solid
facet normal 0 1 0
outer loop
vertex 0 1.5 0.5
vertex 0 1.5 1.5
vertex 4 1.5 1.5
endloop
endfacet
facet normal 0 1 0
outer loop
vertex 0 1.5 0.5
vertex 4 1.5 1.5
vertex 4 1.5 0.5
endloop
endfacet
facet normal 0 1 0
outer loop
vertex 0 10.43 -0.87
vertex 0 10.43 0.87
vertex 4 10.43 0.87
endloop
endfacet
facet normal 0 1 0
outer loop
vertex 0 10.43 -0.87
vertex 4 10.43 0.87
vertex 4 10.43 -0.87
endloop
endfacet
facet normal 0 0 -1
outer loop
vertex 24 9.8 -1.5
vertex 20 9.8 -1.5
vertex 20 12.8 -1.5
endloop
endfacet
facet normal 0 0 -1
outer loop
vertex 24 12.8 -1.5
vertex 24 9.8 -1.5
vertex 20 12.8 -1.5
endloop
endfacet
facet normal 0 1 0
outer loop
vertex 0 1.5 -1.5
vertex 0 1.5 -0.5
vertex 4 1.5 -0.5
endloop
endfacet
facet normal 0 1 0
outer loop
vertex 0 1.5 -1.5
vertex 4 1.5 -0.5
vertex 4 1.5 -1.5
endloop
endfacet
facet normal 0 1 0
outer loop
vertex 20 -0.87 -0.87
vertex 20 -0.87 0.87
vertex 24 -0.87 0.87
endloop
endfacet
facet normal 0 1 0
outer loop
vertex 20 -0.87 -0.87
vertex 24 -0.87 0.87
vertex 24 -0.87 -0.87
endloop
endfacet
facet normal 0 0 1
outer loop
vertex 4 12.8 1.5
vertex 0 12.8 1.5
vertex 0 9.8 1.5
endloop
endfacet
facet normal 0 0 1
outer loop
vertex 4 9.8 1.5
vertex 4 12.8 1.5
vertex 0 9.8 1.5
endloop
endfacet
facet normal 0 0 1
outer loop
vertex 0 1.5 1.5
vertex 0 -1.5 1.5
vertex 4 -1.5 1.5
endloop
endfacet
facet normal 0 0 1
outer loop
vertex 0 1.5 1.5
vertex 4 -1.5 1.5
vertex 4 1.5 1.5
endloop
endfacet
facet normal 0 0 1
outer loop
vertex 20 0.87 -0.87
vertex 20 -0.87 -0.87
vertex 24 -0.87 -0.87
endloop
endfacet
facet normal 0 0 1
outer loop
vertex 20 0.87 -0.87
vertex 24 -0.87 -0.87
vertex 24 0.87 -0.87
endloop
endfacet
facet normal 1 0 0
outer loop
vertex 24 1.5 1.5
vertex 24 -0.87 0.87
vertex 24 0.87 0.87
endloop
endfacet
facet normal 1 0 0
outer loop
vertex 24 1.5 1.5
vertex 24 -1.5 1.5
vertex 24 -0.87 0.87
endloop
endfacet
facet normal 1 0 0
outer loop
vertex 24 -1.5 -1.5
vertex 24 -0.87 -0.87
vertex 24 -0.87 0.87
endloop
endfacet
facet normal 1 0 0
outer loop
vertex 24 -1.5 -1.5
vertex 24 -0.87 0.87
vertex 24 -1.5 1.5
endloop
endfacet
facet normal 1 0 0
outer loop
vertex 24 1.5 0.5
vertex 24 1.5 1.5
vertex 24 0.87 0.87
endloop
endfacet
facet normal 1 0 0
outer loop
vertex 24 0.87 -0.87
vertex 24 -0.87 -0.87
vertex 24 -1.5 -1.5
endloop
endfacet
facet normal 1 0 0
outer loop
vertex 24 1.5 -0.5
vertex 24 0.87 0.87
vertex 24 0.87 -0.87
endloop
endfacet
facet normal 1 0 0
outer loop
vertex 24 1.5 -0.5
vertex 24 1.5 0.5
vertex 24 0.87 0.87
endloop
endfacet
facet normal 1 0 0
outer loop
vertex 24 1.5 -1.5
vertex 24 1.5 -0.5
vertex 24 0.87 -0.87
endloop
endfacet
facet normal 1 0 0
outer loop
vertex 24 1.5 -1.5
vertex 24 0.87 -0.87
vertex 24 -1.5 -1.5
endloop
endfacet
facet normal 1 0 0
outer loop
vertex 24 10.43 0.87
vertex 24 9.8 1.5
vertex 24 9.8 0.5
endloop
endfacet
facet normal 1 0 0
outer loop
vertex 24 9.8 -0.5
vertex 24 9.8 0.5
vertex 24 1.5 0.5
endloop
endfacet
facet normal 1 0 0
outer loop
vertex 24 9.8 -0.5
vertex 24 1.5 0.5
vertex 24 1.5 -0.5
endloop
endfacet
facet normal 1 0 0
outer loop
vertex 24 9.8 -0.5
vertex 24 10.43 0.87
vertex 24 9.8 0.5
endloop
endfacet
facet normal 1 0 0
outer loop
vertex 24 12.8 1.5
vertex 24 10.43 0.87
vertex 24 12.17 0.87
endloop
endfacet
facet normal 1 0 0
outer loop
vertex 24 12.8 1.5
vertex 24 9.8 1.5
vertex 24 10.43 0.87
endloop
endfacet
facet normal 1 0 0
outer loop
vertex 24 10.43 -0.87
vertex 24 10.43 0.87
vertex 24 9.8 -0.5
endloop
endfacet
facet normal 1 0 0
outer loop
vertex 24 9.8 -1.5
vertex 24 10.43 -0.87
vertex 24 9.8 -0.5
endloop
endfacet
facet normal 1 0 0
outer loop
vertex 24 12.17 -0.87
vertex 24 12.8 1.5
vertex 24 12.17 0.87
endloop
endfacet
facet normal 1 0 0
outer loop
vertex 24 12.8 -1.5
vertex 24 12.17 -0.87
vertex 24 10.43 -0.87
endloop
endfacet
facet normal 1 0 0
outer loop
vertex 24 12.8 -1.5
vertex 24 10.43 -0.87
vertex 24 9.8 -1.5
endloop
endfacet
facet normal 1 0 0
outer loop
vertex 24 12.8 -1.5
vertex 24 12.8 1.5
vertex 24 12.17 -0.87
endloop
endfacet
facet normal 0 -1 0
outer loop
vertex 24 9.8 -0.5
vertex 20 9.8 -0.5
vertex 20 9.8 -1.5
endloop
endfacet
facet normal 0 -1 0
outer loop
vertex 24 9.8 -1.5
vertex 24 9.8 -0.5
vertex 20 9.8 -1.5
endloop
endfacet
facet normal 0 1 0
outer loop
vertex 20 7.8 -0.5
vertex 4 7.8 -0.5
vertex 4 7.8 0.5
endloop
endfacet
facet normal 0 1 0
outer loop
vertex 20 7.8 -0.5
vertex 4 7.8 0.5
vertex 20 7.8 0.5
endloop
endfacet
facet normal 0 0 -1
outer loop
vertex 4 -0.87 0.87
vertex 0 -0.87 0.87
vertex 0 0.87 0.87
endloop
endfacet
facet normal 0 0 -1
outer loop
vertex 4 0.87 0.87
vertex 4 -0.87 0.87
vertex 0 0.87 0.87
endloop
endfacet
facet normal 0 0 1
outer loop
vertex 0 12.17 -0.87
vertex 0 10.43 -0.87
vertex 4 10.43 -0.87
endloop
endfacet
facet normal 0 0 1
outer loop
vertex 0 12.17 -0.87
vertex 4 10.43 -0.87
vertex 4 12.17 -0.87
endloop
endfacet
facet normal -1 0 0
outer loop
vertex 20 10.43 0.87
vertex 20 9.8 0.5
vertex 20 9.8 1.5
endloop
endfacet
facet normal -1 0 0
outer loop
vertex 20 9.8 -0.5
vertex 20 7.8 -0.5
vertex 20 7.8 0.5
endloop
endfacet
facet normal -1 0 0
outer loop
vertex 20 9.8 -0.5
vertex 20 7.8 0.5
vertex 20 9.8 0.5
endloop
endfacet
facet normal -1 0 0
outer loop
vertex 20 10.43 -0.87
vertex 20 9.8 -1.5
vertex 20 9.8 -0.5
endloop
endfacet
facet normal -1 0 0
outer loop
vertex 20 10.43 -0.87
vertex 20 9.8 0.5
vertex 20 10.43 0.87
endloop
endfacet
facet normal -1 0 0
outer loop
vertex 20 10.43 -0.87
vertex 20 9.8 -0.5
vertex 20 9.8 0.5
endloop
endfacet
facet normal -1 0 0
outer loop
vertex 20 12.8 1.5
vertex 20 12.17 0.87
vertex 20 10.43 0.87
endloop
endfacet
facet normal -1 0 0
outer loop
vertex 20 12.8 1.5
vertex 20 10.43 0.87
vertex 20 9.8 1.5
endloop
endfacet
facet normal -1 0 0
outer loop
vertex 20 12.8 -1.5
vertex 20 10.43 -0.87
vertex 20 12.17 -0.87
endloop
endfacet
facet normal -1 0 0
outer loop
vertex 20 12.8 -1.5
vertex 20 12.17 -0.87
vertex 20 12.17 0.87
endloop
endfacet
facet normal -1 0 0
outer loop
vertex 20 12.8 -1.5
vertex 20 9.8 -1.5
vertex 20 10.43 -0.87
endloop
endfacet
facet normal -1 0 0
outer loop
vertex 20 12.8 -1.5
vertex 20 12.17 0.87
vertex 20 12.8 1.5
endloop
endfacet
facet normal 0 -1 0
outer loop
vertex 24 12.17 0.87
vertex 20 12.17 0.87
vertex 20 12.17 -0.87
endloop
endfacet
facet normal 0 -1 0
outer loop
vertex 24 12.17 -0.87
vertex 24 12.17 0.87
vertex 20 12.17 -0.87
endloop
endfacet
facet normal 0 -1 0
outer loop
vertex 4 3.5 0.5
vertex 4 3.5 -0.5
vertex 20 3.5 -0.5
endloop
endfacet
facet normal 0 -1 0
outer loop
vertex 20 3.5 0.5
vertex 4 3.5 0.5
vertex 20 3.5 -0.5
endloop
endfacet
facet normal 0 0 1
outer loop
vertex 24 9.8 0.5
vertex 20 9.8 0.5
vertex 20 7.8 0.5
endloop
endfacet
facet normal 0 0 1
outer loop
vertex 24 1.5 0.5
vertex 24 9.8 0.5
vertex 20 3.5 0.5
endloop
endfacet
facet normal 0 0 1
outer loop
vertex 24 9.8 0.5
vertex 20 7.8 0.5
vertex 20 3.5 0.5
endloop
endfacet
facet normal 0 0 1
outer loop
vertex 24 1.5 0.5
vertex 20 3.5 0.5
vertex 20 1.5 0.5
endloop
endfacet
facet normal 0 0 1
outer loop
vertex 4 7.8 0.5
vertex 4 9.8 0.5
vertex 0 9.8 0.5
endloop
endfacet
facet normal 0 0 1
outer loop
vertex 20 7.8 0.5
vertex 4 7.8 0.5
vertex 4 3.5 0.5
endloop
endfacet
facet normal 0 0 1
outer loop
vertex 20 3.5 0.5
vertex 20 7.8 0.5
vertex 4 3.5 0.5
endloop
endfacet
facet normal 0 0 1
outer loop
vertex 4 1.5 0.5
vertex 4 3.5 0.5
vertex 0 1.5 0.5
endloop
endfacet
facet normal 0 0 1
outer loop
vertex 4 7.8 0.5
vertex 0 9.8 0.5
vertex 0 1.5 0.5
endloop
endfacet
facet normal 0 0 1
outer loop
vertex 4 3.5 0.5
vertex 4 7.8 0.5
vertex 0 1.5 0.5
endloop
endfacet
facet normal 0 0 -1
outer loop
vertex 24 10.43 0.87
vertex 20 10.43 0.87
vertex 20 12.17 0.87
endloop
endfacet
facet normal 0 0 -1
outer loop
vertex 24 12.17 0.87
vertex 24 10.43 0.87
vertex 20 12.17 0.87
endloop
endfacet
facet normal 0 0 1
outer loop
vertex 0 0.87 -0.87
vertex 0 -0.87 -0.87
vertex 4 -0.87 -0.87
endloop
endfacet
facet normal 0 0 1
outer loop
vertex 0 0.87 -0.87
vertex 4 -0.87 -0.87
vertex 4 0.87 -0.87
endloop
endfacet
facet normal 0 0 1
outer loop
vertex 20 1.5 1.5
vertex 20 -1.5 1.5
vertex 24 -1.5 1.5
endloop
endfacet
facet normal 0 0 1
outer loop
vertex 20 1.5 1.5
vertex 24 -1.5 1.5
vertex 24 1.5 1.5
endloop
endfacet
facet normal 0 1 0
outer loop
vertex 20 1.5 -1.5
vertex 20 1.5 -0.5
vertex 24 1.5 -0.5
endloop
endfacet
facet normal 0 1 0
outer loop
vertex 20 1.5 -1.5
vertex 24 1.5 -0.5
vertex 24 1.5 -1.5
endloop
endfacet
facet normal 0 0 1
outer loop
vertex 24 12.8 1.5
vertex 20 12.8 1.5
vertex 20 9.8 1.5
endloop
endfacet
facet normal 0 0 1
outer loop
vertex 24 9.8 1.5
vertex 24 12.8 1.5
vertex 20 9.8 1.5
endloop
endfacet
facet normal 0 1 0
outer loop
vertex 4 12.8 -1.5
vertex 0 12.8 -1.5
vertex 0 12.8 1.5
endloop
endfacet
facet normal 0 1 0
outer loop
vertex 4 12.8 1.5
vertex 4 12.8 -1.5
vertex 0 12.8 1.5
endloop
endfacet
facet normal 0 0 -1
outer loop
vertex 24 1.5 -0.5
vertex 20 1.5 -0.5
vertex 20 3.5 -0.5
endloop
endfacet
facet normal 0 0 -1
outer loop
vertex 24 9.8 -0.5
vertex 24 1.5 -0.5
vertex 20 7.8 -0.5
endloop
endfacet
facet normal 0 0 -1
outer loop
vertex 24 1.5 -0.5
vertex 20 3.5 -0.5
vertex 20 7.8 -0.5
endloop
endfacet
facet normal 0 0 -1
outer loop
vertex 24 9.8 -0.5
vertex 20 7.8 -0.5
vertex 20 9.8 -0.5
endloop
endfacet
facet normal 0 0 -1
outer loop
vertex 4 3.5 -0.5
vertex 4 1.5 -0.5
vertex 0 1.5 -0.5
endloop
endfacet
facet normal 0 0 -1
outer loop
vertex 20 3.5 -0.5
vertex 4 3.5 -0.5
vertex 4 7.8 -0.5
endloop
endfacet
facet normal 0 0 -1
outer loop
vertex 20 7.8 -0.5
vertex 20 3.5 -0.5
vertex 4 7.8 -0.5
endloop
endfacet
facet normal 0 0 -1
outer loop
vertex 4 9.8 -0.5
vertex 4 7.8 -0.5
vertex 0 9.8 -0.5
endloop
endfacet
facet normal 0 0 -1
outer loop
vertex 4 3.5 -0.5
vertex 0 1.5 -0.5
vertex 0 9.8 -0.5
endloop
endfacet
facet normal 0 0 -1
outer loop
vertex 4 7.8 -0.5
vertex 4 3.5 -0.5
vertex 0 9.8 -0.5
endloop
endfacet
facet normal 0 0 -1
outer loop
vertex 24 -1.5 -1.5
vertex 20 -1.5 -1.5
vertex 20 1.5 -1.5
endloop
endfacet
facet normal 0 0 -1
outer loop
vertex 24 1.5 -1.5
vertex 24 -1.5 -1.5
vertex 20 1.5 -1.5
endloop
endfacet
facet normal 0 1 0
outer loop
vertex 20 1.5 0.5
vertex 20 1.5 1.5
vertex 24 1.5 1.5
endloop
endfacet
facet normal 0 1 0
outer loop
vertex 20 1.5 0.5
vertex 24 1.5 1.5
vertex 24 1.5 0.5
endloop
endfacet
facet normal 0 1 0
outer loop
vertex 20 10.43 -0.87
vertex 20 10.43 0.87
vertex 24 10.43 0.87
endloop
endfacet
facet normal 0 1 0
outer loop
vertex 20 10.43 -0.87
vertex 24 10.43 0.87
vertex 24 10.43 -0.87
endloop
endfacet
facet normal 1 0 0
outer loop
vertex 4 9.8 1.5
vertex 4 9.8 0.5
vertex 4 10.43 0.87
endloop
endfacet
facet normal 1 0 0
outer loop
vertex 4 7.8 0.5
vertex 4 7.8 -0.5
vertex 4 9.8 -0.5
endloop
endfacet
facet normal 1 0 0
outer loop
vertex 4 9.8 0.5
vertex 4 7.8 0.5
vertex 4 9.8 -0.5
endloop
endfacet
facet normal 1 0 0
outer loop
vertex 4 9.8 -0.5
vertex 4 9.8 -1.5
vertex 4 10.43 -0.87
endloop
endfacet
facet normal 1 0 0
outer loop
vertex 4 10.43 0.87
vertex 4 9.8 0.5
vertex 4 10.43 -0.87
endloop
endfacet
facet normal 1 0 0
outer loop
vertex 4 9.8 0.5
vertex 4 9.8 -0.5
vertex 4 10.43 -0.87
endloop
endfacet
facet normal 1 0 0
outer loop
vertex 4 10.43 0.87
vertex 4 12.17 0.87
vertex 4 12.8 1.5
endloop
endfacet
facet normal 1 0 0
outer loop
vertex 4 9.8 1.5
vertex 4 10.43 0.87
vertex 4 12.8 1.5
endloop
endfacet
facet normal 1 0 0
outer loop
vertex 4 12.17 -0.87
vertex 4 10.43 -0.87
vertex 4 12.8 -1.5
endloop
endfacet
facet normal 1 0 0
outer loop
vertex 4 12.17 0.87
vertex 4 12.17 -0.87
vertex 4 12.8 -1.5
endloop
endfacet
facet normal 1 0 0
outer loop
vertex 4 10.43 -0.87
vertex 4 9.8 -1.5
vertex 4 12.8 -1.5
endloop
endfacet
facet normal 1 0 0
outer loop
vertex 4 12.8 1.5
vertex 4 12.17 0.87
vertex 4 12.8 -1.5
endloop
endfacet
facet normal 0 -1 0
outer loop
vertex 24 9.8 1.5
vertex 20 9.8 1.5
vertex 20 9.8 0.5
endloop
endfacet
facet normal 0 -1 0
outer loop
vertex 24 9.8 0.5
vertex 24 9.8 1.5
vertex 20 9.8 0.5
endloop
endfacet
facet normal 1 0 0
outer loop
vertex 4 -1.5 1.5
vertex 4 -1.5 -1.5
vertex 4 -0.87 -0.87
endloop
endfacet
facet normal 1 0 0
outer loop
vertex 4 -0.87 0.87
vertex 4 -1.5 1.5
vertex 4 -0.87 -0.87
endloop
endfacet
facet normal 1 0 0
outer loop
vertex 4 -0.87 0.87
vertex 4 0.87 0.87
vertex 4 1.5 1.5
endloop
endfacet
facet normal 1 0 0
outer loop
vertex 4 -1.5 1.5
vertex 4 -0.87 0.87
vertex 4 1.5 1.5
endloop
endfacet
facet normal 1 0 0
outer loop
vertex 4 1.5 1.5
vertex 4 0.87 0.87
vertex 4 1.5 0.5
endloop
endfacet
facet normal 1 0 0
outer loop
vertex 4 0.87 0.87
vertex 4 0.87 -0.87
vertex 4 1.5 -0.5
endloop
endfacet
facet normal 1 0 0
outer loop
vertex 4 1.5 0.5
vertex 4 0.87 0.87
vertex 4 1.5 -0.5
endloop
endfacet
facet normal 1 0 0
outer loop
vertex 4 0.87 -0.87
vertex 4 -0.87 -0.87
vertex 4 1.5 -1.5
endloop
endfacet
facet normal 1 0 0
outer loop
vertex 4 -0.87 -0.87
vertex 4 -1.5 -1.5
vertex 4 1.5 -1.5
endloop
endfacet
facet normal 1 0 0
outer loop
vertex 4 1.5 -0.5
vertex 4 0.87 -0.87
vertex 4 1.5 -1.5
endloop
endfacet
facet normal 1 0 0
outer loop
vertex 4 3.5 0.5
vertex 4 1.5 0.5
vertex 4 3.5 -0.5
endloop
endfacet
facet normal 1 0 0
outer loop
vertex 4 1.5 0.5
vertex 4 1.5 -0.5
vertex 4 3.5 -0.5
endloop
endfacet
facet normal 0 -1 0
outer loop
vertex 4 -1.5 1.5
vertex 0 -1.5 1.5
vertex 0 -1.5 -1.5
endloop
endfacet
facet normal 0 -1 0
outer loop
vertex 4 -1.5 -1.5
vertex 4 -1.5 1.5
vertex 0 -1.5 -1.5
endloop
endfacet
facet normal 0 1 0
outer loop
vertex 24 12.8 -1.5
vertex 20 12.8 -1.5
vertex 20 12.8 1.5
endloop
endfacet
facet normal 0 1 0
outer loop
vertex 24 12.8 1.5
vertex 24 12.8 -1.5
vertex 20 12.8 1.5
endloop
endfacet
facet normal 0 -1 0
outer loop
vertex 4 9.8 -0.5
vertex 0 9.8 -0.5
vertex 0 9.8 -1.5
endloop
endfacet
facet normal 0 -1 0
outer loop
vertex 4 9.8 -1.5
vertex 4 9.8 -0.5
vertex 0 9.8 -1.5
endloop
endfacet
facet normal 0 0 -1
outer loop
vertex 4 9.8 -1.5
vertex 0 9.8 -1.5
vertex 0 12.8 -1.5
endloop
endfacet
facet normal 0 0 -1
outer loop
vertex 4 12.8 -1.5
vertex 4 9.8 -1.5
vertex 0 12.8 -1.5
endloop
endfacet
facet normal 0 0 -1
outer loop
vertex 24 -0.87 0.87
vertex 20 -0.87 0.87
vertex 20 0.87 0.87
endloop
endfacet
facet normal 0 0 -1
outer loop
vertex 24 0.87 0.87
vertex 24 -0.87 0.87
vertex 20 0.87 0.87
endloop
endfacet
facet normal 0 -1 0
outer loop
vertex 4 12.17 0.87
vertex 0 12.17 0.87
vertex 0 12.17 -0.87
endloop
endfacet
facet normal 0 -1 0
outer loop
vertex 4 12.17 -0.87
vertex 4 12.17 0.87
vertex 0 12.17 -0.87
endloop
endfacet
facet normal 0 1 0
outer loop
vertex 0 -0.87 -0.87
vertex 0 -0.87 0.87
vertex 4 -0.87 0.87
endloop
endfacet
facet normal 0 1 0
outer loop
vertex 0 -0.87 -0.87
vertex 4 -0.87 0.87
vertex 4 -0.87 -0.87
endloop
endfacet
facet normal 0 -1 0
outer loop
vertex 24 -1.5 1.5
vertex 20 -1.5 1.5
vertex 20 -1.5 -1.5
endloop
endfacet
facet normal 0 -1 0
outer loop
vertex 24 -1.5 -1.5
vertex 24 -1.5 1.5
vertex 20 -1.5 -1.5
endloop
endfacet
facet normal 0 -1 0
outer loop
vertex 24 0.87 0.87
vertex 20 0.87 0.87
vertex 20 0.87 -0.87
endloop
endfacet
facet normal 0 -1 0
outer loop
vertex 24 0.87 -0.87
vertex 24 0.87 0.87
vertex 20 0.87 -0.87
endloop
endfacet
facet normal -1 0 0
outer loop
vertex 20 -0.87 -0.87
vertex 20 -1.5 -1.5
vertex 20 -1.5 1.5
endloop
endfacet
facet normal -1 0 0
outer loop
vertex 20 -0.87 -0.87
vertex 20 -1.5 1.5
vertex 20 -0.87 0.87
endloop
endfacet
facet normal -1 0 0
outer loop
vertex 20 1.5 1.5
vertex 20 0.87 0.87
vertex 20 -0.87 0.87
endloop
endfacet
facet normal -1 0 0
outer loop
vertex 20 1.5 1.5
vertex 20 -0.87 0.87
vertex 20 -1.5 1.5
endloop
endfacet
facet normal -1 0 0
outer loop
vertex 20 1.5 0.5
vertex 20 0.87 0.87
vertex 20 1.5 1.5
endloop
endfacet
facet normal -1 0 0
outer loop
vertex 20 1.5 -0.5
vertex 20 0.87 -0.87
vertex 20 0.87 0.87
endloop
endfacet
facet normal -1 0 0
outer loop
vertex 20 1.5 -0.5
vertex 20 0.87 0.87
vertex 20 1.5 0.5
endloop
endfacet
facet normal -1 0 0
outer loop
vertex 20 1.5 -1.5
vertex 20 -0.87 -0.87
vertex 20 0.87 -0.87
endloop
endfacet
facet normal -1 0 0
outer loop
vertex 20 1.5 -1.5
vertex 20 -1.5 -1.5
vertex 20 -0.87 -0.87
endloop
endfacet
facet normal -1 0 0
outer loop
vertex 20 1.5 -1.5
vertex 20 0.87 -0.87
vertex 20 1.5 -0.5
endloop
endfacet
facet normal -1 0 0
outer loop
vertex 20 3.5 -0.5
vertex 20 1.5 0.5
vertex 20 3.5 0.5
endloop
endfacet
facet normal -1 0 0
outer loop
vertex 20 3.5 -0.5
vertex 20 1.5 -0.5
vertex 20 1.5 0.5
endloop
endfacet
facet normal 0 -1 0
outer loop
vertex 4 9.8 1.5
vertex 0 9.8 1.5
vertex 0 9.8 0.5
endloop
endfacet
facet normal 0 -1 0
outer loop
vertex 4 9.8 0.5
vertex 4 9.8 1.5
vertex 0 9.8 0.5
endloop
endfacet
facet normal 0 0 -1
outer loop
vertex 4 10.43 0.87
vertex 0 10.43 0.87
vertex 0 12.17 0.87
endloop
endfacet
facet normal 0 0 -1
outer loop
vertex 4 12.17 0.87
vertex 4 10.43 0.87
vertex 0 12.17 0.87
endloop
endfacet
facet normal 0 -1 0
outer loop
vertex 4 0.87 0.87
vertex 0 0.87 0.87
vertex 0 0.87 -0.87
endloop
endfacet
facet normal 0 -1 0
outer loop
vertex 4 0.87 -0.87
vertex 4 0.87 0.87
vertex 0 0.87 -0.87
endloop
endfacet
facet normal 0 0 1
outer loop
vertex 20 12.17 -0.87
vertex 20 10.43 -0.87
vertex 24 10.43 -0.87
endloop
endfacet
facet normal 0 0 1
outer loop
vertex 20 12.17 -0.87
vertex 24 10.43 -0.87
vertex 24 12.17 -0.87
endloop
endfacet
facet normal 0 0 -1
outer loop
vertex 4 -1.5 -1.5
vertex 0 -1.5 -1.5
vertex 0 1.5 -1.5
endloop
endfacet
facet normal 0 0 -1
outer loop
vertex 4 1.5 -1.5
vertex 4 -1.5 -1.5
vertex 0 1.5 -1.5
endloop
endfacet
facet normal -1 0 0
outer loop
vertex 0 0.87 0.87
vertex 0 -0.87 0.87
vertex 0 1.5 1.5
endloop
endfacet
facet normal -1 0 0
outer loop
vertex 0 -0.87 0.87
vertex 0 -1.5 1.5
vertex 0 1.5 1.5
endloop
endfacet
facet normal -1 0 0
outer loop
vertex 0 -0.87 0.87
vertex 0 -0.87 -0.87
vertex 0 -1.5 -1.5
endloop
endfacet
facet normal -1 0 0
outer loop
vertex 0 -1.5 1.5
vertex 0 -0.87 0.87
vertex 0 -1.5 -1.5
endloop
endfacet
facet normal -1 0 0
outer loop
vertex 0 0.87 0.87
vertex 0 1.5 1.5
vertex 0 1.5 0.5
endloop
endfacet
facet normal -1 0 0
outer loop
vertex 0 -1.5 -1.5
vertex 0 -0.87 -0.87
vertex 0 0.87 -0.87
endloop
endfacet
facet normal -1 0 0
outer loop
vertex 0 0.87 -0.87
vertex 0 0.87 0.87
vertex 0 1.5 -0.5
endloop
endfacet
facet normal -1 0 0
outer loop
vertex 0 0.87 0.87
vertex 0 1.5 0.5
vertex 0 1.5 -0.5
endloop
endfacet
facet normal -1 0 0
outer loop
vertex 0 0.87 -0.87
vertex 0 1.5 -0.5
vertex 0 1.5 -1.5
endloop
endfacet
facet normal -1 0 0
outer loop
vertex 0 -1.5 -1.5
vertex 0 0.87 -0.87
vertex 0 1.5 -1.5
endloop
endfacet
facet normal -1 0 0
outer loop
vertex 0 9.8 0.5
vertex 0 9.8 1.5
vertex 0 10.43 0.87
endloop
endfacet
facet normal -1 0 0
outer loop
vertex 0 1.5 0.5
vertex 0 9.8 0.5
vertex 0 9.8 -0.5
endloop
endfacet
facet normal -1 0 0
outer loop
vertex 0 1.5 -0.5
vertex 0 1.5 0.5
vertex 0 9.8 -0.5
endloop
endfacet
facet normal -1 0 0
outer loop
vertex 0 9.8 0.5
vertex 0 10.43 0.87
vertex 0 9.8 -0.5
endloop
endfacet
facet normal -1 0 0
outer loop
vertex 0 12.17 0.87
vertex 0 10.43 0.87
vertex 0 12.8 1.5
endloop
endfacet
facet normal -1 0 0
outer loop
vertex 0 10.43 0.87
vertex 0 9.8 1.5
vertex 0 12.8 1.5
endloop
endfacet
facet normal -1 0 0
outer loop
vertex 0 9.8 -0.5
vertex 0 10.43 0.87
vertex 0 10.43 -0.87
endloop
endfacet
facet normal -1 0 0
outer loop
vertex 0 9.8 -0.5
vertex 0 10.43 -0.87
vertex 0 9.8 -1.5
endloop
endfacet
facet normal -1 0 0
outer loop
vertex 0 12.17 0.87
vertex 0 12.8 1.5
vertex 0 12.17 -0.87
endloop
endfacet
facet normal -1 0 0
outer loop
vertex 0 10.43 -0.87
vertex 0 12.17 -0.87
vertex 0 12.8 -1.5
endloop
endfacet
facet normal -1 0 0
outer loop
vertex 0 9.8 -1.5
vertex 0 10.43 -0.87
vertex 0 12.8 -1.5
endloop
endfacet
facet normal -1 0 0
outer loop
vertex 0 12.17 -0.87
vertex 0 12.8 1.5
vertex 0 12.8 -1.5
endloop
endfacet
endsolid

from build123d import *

# Parameters (mm, degrees)
SKETCH_1_W               = 1.74
SKETCH_1_H               = 1.74
SKETCH_1_W_2             = 3
SKETCH_1_H_2             = 3
EXTRUDE_1_DEPTH          = 24
CUT_EXTRUDE_1_DEPTH      = 28.241328896
CUT_EXTRUDE_1_DEPTH_BACK = 28.241328896
SKETCH_2_W               = 16
SKETCH_2_H               = 10


with BuildPart() as part:
    # 草图1 → 凸台-拉伸1 (new body)
    # profile 1 of 2: a face of its own
    with BuildSketch(Plane(origin=(0, 0, 0), x_dir=(0, 0, -1), z_dir=(1, 0, 0))):
        Polygon((0.5, 1.5), (0.5, 9.8), (1.5, 9.8), (1.5, 12.8), (-1.5, 12.8), (-1.5, 9.8), (-0.5, 9.8), (-0.5, 1.5), align=None)
        with Locations((0, 11.3)):
            Rectangle(SKETCH_1_W, SKETCH_1_H, mode=Mode.SUBTRACT)
    # profile 2 of 2: a face of its own
    with BuildSketch(Plane(origin=(0, 0, 0), x_dir=(0, 0, -1), z_dir=(1, 0, 0))):
        Rectangle(SKETCH_1_W_2, SKETCH_1_H_2)
        Rectangle(SKETCH_1_W, SKETCH_1_H, mode=Mode.SUBTRACT)
    extrude(amount=EXTRUDE_1_DEPTH)

    # 草图2 → 切除-拉伸1 (cut, two sides: drawn at the far end of the back side and taken through both)
    with BuildSketch(Plane.XY.offset(-CUT_EXTRUDE_1_DEPTH_BACK)):
        with Locations((12, 12.8)):
            Rectangle(SKETCH_2_W, SKETCH_2_H)
        with Locations((12, -1.5)):
            Rectangle(SKETCH_2_W, SKETCH_2_H)
    extrude(amount=CUT_EXTRUDE_1_DEPTH + CUT_EXTRUDE_1_DEPTH_BACK, mode=Mode.SUBTRACT)


solid = part.part
